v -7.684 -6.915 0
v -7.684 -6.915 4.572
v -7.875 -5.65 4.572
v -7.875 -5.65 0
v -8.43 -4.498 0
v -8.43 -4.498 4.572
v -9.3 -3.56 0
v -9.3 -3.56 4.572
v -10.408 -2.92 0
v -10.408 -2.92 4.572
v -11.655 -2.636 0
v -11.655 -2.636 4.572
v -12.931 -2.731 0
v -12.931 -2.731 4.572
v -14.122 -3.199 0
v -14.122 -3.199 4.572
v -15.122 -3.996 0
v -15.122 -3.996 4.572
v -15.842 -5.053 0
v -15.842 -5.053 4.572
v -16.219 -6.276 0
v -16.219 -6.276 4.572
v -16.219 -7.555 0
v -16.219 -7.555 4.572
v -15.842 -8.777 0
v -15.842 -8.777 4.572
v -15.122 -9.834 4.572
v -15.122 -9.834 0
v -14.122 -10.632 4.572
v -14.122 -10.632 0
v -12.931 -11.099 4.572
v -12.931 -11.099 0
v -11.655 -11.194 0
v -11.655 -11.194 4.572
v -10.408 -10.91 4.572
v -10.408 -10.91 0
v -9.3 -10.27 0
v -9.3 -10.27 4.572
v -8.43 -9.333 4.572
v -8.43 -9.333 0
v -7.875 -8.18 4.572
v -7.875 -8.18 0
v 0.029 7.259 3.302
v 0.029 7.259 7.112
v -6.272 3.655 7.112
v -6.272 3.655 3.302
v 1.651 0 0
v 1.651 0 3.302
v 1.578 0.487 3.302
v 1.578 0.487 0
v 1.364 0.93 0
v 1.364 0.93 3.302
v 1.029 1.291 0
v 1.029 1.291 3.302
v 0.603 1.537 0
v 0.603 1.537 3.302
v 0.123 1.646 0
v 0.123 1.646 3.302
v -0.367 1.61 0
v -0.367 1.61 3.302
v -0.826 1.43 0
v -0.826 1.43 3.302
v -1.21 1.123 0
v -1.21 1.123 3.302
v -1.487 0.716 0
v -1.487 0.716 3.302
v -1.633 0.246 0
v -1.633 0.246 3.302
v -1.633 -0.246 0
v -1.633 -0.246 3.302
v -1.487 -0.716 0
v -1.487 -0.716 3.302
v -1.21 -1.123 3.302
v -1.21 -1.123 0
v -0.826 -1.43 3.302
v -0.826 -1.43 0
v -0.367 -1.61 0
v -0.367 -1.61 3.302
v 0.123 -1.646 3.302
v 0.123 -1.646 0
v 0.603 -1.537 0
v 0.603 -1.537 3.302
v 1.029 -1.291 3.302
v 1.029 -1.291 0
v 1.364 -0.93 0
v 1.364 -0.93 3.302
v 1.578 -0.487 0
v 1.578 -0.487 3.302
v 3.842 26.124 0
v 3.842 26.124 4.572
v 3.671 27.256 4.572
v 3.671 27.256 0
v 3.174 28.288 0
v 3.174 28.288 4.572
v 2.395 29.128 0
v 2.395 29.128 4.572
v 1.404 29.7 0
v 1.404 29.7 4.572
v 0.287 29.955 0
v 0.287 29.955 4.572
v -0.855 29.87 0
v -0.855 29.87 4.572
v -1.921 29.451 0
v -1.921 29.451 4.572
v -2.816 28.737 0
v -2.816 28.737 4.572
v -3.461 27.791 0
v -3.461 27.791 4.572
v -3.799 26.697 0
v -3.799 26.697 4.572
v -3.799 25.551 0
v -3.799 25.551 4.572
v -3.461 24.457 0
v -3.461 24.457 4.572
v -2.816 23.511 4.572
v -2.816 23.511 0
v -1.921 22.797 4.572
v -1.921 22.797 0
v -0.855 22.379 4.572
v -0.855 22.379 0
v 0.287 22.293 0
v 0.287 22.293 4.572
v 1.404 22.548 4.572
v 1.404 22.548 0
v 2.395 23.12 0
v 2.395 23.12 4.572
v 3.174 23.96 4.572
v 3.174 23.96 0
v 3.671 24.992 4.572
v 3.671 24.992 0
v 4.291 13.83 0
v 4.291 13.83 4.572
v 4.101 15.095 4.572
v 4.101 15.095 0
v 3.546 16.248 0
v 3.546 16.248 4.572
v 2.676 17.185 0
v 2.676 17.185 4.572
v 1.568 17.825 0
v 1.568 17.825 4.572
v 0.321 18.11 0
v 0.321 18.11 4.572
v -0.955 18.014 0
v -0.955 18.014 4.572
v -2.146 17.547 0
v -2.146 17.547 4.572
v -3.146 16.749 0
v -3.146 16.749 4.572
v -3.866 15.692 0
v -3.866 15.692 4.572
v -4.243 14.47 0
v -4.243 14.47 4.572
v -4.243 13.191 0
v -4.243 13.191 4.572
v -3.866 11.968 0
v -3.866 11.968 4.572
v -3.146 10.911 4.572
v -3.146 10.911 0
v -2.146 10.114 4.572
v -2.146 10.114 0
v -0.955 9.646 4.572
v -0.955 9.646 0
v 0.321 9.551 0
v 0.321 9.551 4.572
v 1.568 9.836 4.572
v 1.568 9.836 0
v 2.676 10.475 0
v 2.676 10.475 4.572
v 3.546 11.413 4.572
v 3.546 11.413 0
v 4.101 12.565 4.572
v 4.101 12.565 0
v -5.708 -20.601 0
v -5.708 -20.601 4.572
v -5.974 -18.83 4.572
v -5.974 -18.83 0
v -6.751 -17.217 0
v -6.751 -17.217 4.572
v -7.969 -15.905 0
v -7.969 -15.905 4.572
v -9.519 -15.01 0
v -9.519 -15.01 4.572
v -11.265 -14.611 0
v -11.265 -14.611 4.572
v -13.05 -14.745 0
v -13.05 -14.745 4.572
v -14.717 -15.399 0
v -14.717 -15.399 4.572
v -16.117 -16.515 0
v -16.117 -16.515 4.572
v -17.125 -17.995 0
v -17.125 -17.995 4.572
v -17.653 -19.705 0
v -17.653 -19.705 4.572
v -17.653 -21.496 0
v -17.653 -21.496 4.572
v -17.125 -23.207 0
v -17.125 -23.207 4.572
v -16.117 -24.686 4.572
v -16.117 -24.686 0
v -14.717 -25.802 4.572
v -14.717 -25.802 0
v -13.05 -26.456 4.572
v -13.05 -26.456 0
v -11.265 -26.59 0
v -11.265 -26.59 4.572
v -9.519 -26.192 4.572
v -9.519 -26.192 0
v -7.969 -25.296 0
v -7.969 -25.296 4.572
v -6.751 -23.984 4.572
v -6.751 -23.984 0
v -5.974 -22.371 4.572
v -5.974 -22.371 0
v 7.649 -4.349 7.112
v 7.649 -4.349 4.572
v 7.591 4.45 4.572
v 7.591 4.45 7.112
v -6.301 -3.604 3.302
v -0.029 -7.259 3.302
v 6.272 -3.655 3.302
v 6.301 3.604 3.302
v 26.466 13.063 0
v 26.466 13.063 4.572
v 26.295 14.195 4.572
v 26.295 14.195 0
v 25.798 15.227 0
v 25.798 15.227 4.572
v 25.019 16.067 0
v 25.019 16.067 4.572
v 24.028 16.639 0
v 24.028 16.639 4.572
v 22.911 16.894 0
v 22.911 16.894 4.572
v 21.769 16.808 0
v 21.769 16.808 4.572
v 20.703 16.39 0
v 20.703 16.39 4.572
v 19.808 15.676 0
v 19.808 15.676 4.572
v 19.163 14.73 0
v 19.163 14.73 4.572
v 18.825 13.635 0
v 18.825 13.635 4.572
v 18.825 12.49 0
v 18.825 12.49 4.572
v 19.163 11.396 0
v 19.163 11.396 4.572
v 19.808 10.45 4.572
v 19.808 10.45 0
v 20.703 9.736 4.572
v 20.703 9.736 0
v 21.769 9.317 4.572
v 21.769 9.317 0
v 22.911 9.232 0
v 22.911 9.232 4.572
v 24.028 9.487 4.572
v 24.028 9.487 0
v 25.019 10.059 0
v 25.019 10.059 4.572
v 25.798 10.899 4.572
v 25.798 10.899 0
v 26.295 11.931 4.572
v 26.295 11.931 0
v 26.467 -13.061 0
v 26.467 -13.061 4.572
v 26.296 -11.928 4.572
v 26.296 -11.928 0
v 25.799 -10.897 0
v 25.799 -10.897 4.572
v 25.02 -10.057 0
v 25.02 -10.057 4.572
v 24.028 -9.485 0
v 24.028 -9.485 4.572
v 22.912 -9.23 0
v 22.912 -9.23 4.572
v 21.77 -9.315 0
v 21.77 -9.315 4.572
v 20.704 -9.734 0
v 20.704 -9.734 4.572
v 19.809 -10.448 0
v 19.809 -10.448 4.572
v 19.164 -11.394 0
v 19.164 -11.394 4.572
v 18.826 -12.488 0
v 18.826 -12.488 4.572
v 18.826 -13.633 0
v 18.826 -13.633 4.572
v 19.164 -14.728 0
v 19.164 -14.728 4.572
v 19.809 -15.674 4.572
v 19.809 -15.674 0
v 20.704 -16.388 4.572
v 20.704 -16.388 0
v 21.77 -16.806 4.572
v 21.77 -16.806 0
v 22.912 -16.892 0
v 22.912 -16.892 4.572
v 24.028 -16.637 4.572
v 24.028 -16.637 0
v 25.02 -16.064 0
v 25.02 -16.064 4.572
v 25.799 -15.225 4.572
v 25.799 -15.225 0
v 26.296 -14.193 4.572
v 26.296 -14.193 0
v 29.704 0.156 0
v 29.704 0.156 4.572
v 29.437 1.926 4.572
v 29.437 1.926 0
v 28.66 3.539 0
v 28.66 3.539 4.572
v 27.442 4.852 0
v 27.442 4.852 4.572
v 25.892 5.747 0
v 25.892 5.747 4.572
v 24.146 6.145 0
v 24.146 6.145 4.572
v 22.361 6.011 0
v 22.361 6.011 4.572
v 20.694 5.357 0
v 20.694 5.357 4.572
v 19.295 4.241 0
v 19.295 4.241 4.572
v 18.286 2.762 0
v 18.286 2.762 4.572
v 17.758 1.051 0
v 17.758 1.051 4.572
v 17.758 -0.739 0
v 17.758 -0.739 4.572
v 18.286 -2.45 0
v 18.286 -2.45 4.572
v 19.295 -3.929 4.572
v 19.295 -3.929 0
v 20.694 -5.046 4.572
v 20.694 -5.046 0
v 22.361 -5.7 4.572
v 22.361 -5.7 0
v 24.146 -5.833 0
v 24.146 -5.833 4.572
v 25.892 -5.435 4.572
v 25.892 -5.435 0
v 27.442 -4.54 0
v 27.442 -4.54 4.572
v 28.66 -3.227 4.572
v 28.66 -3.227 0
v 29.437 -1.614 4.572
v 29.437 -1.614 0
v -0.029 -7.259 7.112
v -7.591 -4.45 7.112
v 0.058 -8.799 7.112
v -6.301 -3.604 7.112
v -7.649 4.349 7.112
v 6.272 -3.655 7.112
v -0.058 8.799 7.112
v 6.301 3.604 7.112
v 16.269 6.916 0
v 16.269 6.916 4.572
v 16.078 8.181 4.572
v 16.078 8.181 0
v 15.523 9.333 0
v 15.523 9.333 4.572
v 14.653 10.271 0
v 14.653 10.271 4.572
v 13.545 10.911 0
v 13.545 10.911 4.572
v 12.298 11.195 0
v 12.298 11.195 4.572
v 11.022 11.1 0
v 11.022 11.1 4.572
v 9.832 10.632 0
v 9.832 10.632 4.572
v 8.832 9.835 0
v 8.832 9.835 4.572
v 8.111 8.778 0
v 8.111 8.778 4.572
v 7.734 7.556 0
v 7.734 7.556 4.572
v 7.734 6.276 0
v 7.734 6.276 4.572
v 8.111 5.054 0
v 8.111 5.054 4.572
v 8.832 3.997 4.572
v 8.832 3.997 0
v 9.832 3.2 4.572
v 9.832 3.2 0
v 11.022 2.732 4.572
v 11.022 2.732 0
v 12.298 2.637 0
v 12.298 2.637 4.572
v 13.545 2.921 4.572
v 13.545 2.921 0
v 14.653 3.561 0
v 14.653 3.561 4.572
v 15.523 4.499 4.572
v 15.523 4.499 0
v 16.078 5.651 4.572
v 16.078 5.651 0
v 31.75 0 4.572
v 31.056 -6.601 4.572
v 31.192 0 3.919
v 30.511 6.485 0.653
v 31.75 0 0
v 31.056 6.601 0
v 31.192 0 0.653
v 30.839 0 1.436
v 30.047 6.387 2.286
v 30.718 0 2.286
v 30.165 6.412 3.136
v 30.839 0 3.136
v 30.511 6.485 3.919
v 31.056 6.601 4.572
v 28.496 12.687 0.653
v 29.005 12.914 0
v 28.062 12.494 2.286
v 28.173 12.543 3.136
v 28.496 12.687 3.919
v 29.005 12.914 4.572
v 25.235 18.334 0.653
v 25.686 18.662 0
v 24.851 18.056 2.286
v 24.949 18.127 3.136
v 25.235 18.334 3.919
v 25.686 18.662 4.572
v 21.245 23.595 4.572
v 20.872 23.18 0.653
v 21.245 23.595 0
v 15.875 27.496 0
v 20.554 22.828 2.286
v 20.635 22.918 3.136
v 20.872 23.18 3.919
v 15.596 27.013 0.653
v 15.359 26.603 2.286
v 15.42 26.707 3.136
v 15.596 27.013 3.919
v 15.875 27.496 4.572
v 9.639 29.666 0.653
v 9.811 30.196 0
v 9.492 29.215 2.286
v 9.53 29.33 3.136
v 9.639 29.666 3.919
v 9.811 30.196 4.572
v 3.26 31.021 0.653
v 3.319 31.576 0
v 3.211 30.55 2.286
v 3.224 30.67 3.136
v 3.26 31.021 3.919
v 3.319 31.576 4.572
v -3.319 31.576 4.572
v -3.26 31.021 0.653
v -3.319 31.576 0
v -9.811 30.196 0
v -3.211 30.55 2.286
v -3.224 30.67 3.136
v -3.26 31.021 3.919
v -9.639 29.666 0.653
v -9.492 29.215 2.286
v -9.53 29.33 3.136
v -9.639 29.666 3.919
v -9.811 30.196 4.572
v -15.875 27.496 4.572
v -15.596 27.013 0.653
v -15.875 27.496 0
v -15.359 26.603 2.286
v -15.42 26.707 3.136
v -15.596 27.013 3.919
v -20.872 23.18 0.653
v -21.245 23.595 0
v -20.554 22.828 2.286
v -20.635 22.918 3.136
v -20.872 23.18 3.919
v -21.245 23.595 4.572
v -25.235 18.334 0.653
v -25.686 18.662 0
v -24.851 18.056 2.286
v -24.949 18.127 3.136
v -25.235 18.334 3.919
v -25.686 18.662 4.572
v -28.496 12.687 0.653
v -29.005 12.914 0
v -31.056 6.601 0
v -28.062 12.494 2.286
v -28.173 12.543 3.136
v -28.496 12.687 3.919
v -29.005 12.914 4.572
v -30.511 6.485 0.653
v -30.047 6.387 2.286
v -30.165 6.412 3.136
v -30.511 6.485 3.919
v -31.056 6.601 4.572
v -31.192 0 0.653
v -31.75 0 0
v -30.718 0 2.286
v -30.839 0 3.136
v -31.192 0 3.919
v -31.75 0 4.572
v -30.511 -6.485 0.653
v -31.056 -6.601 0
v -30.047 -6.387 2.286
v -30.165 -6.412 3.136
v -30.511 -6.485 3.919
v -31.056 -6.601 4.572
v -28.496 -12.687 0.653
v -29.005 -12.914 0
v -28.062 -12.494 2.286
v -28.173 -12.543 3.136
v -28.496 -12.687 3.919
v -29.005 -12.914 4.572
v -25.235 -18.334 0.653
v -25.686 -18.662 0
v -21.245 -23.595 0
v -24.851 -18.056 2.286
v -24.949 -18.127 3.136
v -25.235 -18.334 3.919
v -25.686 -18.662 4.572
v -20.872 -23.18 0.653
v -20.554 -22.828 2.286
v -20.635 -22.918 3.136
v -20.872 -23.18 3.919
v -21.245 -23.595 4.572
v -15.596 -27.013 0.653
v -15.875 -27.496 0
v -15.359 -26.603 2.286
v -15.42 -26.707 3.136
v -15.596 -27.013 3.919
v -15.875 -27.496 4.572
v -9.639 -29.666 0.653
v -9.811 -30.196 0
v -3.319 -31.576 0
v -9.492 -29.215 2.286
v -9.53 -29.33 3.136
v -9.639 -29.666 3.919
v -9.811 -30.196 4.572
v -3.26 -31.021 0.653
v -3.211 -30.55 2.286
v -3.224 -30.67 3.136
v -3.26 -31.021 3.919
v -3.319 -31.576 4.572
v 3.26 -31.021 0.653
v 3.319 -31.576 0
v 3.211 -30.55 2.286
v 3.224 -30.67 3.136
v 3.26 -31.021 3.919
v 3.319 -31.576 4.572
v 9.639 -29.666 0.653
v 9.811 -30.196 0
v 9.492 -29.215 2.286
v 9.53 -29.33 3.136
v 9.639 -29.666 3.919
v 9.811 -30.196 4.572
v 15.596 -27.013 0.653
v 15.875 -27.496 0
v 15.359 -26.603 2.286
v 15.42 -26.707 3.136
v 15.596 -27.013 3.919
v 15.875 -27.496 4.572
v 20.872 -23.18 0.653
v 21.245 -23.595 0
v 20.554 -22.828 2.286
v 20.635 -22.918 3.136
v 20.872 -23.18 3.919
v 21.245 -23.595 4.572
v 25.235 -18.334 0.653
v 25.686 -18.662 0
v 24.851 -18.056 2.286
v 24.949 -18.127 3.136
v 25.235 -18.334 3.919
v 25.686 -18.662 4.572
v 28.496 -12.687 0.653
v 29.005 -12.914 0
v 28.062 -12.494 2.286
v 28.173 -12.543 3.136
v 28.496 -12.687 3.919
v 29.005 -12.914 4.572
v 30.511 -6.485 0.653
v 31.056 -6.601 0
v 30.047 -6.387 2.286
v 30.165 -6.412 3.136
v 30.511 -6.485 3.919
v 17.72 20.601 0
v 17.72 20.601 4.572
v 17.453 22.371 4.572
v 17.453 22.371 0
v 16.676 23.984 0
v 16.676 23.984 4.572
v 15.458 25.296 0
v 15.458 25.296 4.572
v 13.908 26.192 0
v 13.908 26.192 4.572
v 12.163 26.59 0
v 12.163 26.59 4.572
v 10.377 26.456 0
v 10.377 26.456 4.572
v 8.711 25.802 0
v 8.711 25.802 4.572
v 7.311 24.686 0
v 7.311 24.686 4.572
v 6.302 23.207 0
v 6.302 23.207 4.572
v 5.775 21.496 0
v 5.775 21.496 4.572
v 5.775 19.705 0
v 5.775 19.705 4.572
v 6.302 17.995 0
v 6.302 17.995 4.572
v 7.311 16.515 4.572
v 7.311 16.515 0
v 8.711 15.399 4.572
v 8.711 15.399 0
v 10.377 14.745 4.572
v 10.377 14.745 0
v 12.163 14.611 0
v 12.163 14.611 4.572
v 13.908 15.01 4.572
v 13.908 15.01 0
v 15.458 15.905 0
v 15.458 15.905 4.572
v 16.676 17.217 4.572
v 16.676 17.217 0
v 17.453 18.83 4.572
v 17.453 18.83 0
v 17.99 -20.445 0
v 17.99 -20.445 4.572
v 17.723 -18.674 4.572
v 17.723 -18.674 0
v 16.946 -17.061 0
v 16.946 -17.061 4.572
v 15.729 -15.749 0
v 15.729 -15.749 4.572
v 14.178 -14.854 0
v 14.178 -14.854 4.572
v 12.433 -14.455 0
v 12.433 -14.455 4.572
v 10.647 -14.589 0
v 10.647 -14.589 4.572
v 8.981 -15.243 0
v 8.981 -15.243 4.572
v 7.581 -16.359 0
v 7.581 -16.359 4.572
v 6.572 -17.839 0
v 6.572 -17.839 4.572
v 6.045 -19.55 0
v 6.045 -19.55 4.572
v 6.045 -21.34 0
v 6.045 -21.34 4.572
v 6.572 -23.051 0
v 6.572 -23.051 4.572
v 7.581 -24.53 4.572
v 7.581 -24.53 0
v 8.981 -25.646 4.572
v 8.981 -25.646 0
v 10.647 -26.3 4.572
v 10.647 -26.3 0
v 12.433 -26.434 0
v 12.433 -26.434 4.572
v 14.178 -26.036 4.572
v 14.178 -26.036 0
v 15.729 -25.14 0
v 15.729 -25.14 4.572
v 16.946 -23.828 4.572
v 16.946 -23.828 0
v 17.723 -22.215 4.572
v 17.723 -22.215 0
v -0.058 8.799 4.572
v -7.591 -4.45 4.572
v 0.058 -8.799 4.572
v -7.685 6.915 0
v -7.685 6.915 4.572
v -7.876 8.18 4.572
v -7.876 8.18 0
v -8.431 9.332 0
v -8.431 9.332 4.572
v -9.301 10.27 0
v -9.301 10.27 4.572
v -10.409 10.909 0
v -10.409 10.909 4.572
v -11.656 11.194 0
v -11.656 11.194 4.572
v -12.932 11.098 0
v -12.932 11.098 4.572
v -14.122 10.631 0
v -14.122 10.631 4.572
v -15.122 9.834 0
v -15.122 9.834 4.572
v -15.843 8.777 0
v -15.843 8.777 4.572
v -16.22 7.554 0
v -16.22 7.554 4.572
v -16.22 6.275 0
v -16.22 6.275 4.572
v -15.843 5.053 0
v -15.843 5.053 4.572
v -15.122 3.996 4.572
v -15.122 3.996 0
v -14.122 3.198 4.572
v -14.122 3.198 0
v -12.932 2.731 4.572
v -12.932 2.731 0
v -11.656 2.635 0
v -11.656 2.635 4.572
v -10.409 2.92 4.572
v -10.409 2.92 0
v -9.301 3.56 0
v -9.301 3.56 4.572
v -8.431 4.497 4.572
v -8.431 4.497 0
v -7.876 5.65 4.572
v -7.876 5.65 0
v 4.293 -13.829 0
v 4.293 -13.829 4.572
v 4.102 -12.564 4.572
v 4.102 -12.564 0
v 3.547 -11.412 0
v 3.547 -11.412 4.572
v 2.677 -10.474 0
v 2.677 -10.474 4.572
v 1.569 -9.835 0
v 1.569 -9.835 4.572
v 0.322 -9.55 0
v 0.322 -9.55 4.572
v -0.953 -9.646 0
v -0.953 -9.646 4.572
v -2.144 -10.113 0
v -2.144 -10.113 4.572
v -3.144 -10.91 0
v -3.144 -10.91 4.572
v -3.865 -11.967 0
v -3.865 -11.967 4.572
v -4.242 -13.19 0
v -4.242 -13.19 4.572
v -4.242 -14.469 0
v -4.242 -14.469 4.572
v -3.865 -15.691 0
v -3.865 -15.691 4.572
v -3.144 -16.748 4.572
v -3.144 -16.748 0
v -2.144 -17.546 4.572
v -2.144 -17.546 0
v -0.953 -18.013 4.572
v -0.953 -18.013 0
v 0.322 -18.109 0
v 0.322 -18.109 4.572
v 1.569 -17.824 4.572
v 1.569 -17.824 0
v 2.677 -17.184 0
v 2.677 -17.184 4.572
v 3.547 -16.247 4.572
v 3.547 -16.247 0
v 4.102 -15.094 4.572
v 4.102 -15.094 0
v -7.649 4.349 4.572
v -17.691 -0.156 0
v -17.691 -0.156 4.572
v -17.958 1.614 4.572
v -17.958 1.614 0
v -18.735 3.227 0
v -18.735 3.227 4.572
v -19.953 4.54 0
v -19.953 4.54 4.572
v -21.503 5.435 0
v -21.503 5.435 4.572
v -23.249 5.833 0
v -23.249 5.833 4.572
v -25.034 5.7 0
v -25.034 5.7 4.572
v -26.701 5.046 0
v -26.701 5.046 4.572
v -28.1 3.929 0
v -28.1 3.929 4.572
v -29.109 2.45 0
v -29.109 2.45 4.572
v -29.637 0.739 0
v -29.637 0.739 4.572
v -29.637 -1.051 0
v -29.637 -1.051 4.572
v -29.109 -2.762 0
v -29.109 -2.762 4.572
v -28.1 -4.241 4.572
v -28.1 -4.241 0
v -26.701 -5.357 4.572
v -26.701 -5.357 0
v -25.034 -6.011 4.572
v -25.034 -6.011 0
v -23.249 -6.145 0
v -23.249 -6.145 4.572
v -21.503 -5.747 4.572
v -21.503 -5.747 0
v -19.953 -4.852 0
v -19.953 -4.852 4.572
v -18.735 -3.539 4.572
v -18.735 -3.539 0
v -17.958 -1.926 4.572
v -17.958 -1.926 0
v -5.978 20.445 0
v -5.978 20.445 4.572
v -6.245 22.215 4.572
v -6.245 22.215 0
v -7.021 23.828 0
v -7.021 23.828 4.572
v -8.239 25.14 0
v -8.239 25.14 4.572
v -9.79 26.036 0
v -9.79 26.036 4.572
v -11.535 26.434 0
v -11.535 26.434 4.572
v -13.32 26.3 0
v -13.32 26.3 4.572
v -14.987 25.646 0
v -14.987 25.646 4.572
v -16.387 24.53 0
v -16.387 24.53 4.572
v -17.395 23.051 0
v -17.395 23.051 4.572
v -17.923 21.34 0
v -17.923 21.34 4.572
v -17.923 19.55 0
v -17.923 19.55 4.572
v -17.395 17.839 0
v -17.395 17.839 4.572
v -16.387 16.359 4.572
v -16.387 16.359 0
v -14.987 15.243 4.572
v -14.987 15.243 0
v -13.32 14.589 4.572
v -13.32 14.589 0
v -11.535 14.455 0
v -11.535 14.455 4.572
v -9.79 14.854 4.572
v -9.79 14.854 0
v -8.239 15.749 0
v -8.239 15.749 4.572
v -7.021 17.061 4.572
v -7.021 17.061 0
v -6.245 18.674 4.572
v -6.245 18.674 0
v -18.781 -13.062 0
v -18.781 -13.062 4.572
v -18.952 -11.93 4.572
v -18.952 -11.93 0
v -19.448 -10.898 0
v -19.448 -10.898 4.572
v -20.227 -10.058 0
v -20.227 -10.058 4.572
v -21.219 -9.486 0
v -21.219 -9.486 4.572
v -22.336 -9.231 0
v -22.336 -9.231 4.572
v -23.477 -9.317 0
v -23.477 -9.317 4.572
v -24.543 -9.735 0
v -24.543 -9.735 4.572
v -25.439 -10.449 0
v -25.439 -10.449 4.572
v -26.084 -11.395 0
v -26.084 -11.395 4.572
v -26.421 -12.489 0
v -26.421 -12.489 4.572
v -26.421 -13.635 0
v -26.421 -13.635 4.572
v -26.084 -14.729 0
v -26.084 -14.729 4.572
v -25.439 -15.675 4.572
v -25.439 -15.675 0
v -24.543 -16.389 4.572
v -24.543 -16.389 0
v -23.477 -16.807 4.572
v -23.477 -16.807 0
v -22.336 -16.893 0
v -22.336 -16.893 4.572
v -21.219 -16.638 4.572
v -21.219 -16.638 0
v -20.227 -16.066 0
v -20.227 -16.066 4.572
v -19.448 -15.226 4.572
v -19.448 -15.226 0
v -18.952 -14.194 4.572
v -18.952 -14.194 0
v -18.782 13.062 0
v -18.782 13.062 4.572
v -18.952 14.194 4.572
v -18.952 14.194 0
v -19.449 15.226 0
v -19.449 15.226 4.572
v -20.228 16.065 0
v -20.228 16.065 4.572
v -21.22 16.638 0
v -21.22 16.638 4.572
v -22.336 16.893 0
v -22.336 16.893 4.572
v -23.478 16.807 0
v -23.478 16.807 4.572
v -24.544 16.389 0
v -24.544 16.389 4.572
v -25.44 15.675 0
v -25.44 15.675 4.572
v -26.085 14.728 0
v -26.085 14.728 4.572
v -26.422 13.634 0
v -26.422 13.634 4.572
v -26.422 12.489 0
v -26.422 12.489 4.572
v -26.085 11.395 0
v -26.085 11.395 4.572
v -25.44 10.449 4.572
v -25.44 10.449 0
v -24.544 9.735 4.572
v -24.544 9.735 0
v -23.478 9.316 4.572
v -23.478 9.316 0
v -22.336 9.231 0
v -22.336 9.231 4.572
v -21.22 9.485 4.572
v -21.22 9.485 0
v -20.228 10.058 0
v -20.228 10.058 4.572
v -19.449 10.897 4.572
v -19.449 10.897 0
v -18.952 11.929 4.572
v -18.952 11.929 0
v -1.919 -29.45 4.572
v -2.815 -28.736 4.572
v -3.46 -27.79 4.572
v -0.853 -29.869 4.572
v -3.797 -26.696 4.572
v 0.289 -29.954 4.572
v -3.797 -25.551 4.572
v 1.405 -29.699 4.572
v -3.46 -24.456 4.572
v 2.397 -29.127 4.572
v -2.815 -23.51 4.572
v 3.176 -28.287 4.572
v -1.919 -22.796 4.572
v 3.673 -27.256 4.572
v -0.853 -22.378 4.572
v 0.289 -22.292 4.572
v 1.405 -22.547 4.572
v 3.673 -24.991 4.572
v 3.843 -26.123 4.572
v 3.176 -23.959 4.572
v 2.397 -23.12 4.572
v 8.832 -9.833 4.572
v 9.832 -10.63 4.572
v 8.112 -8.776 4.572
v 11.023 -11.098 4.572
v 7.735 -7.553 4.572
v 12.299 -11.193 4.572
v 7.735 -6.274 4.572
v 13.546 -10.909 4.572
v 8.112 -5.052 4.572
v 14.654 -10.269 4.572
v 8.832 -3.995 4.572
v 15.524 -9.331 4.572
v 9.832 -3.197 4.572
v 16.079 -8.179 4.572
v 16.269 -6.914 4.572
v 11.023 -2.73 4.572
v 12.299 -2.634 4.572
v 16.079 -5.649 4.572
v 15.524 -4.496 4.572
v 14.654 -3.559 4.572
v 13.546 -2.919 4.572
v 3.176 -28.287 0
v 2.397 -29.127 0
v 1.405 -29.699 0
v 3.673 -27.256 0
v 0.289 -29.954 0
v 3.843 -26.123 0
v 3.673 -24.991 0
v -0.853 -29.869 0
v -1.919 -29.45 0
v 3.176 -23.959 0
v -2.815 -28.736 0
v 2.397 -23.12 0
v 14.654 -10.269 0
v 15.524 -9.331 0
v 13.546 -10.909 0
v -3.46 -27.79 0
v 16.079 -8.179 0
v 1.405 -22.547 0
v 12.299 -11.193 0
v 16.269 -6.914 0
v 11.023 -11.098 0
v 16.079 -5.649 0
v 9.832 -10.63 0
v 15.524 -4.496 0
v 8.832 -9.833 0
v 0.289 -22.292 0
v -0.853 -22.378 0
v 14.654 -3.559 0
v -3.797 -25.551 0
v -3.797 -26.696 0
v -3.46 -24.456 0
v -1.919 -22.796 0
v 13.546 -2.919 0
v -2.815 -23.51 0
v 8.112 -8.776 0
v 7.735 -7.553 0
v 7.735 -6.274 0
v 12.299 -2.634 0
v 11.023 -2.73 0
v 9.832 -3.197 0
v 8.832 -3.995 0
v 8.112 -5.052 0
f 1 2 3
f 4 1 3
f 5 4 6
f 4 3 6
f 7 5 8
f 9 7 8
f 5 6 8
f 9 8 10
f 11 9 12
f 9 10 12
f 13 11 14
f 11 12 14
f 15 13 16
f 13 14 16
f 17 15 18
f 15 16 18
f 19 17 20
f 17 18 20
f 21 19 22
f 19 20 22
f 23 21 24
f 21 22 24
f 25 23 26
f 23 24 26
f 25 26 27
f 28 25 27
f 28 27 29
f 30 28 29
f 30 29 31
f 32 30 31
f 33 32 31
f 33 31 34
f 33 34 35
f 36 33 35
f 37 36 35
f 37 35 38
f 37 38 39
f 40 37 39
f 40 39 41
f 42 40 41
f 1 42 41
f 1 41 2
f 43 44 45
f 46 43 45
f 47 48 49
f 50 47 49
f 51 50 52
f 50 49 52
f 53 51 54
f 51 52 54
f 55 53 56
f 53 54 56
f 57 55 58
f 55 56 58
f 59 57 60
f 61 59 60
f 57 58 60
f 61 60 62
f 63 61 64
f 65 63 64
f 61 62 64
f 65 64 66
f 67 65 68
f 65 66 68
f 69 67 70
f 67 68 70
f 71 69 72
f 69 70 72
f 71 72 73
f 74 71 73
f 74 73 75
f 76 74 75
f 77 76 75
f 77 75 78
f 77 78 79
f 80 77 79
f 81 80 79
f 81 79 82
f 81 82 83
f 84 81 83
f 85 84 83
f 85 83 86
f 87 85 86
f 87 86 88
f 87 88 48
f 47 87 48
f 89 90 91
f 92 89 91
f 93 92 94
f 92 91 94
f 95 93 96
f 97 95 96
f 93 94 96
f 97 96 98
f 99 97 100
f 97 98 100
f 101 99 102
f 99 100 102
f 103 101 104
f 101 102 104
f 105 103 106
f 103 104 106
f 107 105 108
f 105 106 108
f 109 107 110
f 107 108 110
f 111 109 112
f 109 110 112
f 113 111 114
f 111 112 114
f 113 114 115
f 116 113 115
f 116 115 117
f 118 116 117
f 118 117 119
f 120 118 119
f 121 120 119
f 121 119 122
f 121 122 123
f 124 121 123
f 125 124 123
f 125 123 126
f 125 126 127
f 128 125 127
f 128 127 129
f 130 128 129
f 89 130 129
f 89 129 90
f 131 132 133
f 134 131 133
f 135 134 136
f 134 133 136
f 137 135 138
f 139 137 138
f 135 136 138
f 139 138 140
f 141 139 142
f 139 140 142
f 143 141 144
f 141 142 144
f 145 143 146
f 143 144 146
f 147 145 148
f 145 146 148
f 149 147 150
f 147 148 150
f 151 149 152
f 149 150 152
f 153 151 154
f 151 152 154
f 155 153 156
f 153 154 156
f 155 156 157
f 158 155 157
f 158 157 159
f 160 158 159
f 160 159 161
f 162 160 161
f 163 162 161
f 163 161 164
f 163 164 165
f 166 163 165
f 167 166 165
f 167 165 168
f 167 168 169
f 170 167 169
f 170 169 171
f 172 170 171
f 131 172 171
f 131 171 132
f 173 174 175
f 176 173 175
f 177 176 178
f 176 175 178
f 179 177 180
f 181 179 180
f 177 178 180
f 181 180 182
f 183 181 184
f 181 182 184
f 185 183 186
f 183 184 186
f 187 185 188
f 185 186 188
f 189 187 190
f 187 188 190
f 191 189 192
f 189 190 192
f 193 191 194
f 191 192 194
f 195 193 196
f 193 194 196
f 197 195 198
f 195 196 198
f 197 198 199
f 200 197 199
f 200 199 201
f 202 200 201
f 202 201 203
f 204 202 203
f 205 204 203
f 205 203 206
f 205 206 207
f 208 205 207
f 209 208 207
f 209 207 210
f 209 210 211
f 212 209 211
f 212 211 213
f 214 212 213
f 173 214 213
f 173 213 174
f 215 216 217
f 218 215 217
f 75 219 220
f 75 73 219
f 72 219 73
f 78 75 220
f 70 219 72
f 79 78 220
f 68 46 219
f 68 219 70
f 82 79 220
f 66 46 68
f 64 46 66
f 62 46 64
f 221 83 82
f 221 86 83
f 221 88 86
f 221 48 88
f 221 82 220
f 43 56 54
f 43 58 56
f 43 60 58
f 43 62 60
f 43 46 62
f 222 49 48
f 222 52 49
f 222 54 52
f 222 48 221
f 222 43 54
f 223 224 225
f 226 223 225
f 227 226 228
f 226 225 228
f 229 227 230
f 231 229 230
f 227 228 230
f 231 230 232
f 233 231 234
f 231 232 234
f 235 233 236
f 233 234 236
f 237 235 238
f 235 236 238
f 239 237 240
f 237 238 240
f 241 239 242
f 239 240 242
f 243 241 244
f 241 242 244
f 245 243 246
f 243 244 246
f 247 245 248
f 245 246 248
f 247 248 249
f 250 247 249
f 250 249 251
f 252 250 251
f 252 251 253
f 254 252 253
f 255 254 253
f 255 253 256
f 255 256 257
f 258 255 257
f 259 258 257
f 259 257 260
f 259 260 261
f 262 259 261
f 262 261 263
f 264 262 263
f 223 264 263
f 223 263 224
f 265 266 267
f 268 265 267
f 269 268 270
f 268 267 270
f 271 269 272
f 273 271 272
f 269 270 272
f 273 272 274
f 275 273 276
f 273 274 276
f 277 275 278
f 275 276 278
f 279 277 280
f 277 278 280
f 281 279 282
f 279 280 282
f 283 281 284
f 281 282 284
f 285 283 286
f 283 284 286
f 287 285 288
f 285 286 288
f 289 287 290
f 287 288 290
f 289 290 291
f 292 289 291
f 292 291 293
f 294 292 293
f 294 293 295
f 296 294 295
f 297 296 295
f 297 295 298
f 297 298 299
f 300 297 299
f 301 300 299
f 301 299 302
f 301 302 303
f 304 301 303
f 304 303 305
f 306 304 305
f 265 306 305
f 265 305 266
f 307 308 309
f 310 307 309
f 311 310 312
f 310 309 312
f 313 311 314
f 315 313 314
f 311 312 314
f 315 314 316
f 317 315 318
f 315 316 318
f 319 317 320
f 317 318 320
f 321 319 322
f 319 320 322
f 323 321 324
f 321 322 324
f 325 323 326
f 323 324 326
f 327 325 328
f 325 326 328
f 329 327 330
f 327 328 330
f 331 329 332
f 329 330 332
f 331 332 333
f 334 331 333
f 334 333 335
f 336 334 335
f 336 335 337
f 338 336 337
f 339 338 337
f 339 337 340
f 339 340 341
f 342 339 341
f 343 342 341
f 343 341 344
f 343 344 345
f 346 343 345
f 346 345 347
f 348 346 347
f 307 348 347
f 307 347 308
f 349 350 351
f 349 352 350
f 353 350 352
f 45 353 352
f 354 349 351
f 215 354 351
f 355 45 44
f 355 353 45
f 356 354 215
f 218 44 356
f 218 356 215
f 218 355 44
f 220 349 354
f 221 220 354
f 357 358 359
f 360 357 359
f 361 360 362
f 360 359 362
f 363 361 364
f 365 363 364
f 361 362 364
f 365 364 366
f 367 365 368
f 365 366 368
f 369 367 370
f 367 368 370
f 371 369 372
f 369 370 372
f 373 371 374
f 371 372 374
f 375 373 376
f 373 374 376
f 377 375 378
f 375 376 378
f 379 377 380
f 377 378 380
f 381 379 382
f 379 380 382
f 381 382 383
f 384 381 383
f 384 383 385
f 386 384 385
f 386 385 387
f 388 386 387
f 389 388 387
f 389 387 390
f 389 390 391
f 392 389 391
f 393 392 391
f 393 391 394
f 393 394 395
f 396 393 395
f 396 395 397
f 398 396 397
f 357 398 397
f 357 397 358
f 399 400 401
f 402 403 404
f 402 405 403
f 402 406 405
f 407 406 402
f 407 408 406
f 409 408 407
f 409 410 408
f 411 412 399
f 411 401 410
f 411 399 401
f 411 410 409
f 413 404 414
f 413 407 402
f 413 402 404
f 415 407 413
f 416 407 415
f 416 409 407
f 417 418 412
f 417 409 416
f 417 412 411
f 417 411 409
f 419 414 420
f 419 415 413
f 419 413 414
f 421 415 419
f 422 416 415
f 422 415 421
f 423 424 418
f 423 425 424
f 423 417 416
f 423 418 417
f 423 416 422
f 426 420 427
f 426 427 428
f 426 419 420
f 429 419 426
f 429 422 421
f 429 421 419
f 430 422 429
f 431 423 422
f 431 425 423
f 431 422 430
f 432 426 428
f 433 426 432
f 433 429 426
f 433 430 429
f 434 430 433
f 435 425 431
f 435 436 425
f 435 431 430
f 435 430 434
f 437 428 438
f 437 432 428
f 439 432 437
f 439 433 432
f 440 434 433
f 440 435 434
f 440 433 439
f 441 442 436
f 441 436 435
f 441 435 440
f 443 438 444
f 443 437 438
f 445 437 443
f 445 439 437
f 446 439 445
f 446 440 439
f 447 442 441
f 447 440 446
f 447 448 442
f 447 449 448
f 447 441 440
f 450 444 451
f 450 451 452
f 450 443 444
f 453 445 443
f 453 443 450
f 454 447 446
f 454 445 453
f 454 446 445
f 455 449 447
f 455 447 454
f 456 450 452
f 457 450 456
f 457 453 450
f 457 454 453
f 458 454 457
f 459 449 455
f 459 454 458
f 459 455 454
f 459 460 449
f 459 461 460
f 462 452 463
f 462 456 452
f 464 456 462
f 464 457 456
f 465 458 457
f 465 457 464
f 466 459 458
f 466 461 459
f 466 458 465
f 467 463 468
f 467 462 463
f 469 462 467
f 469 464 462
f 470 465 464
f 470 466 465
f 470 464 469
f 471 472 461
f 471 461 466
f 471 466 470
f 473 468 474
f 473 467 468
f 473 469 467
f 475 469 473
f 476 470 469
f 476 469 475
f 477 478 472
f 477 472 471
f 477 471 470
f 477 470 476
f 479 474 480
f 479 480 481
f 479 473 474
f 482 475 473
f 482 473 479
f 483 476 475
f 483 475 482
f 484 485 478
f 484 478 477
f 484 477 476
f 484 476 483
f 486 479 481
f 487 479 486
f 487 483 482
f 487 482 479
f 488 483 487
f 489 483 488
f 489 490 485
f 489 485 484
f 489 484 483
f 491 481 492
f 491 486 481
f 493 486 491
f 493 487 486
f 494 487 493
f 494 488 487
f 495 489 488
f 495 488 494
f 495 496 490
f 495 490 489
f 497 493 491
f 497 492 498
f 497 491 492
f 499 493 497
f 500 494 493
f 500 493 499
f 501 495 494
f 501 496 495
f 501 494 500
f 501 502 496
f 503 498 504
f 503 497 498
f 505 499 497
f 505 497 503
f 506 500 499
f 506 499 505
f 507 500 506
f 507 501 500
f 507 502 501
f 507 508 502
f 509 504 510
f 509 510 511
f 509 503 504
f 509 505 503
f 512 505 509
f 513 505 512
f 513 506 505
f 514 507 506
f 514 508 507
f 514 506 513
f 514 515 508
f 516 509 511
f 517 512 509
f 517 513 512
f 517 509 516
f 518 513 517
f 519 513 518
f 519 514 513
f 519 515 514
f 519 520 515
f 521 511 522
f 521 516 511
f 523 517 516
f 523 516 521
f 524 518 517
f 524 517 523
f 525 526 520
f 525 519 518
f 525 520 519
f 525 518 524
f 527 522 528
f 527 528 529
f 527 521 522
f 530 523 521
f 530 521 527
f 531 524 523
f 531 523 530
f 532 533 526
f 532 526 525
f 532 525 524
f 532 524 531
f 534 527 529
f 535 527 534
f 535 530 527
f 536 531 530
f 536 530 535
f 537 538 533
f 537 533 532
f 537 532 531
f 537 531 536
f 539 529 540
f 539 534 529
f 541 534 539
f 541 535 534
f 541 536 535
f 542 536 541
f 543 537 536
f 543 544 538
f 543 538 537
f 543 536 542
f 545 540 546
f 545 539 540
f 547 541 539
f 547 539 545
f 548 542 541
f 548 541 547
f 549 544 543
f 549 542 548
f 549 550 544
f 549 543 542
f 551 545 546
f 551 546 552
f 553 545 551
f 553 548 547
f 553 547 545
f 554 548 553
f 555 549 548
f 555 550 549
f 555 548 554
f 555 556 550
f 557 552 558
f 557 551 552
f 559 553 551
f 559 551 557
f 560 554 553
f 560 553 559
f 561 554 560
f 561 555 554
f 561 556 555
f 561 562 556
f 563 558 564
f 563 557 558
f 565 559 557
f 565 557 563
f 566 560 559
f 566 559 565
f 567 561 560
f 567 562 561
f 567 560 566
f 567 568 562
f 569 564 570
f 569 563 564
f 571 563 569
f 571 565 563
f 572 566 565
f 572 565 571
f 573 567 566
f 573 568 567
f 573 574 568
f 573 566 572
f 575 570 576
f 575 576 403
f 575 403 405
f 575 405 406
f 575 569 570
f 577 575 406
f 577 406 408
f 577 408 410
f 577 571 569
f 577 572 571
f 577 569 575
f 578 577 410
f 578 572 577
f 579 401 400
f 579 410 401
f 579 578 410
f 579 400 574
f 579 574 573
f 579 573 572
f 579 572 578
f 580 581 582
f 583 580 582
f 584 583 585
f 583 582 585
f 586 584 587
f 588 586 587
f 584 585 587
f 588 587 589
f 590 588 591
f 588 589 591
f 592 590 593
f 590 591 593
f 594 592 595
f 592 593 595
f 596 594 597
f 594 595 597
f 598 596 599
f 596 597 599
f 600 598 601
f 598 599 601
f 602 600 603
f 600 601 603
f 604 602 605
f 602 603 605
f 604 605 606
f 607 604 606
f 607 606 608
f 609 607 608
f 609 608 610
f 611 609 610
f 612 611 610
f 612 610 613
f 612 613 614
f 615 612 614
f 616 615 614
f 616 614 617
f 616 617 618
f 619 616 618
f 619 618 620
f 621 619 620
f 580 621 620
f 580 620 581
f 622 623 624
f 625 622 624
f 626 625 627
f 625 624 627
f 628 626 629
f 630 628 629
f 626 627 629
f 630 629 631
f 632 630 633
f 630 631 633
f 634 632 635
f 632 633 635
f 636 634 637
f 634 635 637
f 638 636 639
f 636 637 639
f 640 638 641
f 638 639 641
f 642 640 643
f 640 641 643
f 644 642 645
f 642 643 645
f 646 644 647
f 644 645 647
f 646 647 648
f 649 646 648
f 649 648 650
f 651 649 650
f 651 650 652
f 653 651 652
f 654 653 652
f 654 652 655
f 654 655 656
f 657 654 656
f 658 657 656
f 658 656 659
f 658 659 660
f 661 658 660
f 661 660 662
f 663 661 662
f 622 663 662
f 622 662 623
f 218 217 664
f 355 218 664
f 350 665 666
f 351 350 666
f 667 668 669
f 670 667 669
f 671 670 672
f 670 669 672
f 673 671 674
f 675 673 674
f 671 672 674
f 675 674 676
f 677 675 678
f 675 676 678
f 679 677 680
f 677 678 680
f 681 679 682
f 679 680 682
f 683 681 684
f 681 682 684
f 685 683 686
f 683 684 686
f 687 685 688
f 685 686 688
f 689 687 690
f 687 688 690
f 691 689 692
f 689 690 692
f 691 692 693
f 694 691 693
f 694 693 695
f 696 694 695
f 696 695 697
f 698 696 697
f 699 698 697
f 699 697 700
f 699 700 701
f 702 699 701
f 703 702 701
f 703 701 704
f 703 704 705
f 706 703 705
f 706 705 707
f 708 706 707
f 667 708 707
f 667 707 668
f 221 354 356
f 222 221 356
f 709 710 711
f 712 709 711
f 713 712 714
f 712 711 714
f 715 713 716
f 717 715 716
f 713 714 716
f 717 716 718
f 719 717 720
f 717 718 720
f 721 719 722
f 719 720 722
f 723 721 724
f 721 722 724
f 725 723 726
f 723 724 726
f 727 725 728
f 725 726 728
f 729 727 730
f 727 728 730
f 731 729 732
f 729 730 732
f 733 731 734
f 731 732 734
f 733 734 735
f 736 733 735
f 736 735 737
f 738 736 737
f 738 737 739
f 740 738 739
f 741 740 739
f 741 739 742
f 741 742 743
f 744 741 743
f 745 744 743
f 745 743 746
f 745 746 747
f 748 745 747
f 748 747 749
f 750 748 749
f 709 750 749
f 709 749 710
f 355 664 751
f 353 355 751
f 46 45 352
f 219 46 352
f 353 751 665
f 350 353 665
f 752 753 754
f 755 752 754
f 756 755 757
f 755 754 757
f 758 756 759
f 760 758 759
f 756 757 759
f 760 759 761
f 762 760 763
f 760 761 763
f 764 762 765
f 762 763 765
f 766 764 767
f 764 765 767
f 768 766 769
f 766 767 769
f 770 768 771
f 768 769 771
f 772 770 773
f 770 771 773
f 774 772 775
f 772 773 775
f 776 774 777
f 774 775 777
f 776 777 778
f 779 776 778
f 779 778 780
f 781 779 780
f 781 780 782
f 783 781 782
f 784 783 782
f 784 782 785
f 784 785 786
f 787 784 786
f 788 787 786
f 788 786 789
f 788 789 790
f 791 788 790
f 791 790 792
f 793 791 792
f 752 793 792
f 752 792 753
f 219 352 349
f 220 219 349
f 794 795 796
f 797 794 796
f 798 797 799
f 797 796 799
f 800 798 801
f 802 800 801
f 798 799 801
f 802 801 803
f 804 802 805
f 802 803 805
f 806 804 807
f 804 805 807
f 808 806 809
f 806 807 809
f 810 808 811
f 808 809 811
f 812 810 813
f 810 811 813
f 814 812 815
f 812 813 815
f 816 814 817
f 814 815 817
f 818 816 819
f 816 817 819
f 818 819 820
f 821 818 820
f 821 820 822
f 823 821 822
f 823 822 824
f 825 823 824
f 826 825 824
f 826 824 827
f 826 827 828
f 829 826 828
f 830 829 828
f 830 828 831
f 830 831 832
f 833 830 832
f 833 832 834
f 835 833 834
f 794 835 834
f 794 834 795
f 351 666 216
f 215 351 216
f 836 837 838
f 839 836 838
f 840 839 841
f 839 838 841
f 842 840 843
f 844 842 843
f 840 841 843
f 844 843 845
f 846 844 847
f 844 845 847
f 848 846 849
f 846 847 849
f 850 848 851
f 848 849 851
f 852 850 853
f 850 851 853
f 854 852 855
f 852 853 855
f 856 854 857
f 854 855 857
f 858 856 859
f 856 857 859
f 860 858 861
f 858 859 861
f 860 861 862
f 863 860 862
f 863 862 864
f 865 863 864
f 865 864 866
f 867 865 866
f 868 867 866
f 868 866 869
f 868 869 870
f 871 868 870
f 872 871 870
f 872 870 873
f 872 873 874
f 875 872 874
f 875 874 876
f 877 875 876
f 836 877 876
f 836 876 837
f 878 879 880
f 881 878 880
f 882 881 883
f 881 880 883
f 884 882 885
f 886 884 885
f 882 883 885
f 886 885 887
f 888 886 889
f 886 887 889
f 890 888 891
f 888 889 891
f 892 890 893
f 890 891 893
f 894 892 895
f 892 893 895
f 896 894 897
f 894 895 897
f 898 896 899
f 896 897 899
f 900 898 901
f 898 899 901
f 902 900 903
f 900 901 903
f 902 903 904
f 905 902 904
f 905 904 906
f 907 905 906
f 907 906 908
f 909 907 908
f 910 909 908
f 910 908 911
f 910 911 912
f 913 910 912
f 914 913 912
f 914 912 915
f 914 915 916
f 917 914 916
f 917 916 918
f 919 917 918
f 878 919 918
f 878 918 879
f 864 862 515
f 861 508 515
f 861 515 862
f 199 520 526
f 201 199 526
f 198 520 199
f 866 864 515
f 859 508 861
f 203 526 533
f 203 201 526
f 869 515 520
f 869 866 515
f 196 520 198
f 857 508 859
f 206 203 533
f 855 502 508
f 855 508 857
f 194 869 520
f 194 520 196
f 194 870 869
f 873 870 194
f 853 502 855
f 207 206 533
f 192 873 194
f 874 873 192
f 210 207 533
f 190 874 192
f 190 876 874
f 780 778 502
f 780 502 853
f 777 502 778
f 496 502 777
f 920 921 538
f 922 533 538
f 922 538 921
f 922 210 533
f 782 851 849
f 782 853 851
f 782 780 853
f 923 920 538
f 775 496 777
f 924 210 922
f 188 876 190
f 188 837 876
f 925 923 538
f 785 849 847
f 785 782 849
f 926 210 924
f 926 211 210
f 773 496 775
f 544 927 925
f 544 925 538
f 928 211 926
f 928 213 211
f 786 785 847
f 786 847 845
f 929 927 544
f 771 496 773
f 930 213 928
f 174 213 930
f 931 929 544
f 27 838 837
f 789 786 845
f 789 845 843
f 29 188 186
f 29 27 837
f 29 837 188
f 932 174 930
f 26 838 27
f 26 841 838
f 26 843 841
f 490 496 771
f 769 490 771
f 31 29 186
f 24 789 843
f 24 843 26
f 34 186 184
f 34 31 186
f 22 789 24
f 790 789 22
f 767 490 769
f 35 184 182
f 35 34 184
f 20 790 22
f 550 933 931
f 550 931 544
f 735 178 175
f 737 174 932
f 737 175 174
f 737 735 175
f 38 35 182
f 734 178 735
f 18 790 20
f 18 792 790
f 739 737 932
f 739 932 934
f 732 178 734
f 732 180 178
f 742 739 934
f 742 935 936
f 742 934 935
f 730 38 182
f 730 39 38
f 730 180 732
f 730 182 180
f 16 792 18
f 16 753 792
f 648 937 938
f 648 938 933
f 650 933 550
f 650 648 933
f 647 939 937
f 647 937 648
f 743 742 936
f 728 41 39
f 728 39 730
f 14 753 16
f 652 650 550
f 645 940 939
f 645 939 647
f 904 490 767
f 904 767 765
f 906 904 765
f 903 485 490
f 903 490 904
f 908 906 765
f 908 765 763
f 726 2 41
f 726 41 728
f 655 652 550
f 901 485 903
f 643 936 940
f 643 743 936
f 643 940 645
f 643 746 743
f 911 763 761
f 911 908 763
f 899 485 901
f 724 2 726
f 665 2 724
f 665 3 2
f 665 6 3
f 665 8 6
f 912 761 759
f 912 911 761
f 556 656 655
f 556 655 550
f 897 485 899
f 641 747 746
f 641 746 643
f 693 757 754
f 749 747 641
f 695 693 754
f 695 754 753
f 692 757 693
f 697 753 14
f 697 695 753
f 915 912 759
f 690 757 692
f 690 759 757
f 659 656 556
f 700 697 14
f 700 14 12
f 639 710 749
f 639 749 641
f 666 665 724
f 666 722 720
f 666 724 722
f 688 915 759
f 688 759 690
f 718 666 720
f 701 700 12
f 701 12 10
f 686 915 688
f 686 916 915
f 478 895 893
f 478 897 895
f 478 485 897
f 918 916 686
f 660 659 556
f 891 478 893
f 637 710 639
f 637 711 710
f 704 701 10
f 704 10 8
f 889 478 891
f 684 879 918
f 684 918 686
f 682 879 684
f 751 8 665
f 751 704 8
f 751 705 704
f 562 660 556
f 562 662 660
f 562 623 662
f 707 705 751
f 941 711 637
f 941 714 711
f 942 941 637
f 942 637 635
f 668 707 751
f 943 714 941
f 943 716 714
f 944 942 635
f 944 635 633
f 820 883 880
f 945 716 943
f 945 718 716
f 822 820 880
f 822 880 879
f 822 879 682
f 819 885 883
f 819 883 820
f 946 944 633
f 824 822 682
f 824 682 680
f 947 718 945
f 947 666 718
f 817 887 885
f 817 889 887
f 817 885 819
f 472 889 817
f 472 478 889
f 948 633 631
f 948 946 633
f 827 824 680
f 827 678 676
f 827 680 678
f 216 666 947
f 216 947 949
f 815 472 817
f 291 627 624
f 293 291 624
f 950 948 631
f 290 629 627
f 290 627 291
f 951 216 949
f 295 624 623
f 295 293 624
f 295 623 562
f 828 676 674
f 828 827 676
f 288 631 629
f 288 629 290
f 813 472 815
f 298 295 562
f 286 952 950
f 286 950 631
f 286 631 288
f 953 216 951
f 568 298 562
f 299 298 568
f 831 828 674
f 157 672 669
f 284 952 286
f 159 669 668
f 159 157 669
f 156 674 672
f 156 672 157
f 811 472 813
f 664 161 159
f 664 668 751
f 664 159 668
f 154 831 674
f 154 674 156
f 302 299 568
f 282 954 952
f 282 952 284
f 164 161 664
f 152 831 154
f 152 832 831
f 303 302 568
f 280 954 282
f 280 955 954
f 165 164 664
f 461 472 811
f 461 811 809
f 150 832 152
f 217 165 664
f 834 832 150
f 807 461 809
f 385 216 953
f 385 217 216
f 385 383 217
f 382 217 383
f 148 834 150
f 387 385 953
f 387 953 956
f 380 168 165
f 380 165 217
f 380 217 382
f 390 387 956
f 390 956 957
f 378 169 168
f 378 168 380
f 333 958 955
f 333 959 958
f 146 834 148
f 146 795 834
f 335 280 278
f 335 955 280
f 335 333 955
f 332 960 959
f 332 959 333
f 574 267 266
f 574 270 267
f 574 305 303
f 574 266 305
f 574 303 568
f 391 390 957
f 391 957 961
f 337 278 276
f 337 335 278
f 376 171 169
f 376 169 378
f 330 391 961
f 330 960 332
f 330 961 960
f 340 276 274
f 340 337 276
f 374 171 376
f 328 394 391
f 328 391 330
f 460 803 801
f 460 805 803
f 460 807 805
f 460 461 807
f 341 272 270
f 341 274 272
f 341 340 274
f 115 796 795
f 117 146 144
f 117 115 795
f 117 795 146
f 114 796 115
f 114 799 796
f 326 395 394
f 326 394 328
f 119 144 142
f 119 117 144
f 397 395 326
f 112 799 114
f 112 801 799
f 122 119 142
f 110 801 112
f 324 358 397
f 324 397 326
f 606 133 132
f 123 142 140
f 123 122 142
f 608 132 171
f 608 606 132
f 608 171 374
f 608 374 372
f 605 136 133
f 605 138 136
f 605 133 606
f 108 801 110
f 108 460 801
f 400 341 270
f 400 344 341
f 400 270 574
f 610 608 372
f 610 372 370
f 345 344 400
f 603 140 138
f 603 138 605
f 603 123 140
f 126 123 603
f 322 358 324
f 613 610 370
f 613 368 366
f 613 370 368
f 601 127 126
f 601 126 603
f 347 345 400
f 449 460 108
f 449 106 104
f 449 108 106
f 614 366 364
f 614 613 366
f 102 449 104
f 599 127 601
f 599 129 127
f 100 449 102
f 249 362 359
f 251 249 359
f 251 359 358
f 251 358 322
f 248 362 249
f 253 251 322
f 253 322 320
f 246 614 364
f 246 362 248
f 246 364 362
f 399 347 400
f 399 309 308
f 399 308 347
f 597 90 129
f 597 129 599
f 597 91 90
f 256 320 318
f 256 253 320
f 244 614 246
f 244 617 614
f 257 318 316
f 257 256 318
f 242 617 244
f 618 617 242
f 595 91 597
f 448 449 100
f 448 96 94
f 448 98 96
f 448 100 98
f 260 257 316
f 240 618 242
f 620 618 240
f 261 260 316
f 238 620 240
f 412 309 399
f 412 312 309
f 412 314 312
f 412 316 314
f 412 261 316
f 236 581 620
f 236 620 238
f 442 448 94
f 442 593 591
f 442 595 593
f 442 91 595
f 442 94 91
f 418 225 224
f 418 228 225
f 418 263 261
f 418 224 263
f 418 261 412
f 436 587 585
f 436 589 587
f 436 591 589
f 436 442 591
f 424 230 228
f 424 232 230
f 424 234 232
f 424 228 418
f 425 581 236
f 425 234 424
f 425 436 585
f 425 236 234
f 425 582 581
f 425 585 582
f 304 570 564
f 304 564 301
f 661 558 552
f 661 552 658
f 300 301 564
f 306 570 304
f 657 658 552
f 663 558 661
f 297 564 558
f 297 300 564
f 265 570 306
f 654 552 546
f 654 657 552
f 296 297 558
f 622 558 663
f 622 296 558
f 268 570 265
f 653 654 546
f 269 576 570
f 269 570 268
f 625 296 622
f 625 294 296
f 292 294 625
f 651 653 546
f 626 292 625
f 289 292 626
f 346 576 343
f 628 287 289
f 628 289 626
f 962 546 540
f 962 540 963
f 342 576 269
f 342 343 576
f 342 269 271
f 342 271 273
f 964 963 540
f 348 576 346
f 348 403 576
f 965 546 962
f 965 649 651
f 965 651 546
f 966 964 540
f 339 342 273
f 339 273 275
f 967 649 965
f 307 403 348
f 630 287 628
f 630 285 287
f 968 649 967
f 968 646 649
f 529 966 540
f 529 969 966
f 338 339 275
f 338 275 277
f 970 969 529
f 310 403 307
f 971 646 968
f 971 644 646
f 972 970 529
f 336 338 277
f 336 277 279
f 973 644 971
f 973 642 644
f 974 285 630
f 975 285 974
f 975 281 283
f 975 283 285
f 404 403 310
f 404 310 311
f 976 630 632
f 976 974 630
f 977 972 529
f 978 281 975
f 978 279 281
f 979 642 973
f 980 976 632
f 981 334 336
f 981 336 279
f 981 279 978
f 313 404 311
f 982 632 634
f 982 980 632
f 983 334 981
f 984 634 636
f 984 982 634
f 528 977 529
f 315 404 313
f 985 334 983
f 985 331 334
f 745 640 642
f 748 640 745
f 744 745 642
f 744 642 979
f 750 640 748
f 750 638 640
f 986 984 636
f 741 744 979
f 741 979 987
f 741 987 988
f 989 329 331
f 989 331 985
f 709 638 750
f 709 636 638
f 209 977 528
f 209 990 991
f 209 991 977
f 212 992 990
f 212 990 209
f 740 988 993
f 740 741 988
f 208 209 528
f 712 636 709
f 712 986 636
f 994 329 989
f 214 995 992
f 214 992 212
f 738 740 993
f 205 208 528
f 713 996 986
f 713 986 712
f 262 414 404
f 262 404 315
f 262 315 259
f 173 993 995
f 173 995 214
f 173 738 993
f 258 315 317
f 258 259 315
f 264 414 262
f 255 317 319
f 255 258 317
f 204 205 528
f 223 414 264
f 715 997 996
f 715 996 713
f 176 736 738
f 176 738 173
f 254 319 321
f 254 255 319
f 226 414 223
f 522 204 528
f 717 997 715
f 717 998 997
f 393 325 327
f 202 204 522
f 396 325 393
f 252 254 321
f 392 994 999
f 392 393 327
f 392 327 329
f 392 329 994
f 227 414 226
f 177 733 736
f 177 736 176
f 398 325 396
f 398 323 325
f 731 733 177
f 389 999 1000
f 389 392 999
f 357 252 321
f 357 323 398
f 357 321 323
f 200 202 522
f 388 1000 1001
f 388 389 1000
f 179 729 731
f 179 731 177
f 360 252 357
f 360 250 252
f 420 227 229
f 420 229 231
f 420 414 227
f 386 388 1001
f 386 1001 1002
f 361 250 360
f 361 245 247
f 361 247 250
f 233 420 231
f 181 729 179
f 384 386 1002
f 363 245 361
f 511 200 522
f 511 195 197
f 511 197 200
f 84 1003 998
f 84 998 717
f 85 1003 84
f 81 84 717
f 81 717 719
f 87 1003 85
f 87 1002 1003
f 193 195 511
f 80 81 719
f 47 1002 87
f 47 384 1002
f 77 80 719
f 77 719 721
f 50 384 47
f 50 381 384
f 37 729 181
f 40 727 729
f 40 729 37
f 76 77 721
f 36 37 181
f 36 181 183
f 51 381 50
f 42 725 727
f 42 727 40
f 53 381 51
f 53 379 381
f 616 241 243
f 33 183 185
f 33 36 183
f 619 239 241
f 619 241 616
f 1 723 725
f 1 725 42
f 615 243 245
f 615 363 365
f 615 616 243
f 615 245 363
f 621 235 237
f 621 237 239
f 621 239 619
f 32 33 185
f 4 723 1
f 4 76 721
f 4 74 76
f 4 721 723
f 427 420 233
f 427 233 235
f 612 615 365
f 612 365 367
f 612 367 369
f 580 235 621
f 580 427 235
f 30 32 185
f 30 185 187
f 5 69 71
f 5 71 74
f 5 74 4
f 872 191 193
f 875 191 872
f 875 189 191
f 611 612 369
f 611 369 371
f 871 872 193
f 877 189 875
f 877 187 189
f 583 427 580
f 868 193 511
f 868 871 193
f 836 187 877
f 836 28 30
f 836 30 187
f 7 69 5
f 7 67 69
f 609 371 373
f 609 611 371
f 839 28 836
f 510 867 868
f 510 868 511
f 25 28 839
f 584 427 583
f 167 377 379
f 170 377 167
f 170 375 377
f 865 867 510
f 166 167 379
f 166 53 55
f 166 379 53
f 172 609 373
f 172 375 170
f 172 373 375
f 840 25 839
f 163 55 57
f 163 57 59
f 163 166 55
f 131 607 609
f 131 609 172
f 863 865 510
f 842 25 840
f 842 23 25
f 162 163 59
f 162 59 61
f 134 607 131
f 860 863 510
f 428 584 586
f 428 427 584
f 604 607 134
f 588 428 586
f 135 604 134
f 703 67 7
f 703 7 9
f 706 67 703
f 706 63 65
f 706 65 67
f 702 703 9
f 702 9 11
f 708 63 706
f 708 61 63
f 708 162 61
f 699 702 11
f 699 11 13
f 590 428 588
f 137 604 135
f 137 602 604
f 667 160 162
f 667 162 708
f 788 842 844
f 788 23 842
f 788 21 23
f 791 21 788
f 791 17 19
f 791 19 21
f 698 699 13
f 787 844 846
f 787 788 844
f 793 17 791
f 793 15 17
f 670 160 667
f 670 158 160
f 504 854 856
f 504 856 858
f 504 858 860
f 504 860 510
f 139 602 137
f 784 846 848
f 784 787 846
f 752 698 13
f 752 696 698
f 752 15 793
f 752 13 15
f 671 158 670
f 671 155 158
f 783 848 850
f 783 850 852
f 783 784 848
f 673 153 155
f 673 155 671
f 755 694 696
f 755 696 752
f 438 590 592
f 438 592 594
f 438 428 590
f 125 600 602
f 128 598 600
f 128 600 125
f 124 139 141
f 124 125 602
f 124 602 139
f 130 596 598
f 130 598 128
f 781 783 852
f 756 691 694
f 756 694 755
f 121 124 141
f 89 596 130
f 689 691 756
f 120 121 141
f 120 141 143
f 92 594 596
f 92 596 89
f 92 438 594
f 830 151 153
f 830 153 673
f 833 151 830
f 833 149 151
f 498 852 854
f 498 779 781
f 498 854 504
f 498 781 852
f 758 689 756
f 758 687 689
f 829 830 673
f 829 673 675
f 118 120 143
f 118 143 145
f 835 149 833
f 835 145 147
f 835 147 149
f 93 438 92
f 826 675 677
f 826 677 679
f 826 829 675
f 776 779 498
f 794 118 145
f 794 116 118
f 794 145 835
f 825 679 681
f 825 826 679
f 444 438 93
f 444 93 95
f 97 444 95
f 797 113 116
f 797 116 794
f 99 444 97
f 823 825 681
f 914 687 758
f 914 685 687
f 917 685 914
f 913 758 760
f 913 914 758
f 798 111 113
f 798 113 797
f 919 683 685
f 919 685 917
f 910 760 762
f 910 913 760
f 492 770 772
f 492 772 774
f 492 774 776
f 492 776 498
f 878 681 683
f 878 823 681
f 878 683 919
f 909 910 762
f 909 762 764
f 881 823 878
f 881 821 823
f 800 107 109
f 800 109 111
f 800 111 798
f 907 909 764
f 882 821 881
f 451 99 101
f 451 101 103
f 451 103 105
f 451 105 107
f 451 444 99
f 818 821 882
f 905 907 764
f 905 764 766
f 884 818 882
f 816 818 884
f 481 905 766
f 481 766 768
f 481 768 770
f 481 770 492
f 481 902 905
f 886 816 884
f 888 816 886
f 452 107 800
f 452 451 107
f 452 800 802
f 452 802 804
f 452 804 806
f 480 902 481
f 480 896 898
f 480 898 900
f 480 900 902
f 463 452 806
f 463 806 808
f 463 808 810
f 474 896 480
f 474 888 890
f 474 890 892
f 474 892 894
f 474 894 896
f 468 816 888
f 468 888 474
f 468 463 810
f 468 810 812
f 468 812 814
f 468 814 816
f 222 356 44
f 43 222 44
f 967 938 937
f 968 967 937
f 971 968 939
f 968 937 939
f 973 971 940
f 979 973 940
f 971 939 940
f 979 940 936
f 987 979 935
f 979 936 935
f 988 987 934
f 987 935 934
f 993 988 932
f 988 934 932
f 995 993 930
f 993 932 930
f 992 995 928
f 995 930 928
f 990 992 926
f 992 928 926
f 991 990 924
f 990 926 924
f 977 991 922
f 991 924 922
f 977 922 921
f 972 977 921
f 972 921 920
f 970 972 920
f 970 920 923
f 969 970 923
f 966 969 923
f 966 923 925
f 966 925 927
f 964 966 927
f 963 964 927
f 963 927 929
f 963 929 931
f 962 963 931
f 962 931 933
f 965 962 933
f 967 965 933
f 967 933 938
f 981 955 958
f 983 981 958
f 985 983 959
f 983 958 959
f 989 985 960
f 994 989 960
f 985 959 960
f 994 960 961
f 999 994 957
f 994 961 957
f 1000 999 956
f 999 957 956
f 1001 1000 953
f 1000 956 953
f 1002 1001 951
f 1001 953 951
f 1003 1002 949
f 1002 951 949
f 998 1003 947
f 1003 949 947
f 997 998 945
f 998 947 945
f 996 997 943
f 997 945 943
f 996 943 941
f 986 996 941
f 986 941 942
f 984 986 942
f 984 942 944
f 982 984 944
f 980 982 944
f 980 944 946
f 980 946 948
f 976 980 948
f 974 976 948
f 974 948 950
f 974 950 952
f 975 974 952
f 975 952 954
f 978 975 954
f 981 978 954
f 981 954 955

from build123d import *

# Parameters (mm, degrees)
F3_DEPTH = 2.54
F4_R     = 6.006136
F4_R_2   = 4.291362
F4_R_3   = 3.841772
F5_DEPTH = 25.4
F7_DEPTH = 3.81
F8_R     = 1.651
F9_DEPTH = 25.4


with BuildPart() as f1:
    # F0 (on Front) → F1 (revolve)
    with BuildSketch(Plane.XZ):
        with BuildLine():
            Line((0, 4.572), (0, 0))
            Line((0, 0), (31.75, 0))
            ThreePointArc((31.75, 0), (30.718062, 2.286), (31.75, 4.572))
            Line((31.75, 4.572), (0, 4.572))
        make_face()
    revolve(axis=Axis((0, 0, 2.286), (0, 0, 1)))

    # F2 (on face) → F3 (join)
    with BuildSketch(Plane.XY.offset(4.572)):
        Polygon((-0.058218, 8.798626), (-7.648942, 4.348895), (-7.590724, -4.449731), (0.058218, -8.798626), (7.648942, -4.348895), (7.590724, 4.449731), align=None)
    extrude(amount=F3_DEPTH)

    # F4 (on face) → F5 (cut)
    with BuildSketch(Plane.XY.offset(4.572)):
        with Locations((-11.983808, 20.4447)):
            Circle(F4_R)
        with Locations((0, 13.830239)):
            Circle(F4_R_2)
        with Locations((0, 26.124066)):
            Circle(F4_R_3)
        with Locations((11.713726, 20.600633)):
            Circle(F4_R)
        with Locations((11.977333, 6.915986)):
            Circle(F4_R_2)
        with Locations((23.697534, 0.155932)):
            Circle(F4_R)
        with Locations((22.624847, -13.060728)):
            Circle(F4_R_3)
        with Locations((11.97808, -6.913814)):
            Circle(F4_R_2)
        with Locations((11.983808, -20.4447)):
            Circle(F4_R)
        with Locations((0.001496, -26.123189)):
            Circle(F4_R_3)
        with Locations((0.001496, -13.829362)):
            Circle(F4_R_2)
        with Locations((-11.713726, -20.600633)):
            Circle(F4_R)
        with Locations((-11.975837, -6.91511)):
            Circle(F4_R_2)
        with Locations((-23.697534, -0.155932)):
            Circle(F4_R)
        with Locations((-22.623351, 13.061604)):
            Circle(F4_R_3)
        with Locations((-11.976585, 6.914691)):
            Circle(F4_R_2)
        with Locations((-22.622603, -13.062023)):
            Circle(F4_R_3)
        with Locations((22.624099, 13.0629)):
            Circle(F4_R_3)
    extrude(amount=-F5_DEPTH, mode=Mode.SUBTRACT)

    # F6 (on face) → F7 (cut)
    with BuildSketch(Plane.XY.offset(7.112)):
        Polygon((6.300916, 3.604427), (0.028933, 7.258967), (-6.271984, 3.65454), (-6.300916, -3.604427), (-0.028933, -7.258967), (6.271984, -3.65454), align=None)
    extrude(amount=-F7_DEPTH, mode=Mode.SUBTRACT)

    # F8 (on face) → F9 (cut)
    with BuildSketch(Plane.XY.offset(3.302)):
        Circle(F8_R)
    extrude(amount=-F9_DEPTH, mode=Mode.SUBTRACT)


solid = f1.part
